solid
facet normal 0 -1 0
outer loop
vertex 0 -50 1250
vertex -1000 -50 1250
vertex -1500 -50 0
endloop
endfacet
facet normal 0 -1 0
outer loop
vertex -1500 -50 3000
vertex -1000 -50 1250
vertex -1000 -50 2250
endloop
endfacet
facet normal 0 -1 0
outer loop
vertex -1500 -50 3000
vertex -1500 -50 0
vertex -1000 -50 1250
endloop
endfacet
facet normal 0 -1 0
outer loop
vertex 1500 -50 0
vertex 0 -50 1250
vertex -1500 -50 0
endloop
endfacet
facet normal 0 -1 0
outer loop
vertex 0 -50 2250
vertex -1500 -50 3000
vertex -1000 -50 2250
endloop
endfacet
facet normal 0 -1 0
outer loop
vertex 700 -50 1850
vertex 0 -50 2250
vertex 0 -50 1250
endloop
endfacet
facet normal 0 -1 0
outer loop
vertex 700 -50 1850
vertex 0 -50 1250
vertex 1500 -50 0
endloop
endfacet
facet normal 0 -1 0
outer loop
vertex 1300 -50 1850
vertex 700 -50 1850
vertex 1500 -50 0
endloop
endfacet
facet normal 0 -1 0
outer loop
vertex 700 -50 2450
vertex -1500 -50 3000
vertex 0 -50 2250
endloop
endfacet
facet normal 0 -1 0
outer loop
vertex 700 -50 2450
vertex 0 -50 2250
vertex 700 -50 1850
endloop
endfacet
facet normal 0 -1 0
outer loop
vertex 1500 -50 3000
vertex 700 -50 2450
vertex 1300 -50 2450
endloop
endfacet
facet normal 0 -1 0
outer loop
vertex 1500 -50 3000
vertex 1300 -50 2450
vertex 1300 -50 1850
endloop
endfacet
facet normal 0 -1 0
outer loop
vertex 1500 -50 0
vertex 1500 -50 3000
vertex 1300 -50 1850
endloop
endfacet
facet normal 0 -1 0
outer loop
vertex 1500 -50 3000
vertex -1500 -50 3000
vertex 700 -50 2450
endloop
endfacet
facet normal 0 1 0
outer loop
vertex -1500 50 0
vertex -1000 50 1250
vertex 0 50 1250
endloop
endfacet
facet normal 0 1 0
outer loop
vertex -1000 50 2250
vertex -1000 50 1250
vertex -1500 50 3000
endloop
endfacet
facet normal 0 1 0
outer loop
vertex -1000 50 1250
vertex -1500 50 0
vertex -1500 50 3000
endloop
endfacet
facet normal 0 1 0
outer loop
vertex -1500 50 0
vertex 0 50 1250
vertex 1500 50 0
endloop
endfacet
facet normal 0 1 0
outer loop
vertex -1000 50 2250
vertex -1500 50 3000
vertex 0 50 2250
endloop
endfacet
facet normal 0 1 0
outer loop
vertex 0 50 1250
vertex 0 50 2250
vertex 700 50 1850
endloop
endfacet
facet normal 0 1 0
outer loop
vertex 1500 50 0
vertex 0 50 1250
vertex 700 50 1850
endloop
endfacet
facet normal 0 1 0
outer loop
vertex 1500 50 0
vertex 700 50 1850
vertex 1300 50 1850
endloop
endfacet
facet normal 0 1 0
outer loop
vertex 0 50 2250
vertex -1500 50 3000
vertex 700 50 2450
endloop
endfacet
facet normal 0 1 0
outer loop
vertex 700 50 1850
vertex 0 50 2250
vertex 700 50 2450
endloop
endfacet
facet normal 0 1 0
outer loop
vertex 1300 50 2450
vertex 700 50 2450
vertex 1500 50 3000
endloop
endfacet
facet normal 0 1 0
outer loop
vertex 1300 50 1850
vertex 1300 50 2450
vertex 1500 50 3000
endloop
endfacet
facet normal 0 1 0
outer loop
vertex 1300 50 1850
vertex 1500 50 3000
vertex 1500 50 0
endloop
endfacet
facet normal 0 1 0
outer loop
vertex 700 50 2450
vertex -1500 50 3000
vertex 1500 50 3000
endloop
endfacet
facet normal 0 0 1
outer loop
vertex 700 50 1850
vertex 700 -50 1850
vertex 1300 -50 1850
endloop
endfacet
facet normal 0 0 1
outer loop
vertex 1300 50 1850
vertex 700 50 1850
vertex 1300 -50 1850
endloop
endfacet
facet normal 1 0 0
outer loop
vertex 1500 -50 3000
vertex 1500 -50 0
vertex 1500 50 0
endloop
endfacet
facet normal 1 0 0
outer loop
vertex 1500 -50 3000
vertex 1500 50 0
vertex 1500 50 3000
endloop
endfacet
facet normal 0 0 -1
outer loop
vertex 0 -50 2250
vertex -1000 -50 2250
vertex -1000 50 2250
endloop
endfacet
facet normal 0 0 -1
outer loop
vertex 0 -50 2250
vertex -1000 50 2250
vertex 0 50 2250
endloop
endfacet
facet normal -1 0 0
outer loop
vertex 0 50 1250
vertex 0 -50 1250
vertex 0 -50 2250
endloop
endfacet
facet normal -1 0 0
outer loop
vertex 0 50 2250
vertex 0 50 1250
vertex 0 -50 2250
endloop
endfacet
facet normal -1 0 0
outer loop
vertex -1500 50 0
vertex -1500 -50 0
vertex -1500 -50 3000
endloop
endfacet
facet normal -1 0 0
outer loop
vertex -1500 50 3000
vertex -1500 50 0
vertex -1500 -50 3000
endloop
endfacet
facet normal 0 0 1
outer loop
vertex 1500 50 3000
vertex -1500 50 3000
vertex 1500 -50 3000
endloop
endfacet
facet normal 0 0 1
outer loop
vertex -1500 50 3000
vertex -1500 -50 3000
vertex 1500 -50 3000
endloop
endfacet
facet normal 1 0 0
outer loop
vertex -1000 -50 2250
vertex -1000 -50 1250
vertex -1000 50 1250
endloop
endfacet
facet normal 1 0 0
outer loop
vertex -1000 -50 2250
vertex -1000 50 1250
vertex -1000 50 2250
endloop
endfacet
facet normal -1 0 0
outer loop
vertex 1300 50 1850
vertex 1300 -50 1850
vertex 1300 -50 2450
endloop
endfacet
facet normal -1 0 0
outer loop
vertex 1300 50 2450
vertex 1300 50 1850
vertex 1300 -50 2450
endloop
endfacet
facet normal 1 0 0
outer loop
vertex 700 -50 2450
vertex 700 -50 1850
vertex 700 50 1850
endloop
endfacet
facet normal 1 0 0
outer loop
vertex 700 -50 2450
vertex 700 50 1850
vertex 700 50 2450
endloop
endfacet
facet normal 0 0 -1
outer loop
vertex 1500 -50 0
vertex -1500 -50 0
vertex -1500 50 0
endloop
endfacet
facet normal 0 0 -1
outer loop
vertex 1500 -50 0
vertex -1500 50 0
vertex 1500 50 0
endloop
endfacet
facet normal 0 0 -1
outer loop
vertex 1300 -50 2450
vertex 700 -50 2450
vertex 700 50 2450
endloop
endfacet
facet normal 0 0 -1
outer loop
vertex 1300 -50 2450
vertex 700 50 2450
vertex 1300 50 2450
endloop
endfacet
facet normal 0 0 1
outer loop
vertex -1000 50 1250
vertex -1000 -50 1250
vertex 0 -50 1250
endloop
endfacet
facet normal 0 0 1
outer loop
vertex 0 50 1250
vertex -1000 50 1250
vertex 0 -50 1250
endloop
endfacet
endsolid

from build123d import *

# Parameters (mm, degrees)
F0_W     = 3000
F0_H     = 3000
F1_DEPTH = 50
F2_W     = 1000
F2_H     = 1000
F2_W_2   = 600
F2_H_2   = 600
F3_DEPTH = 100.001


with BuildPart() as f1:
    # F0 (on Front) → F1 (new body, symmetric)
    with BuildSketch(Plane.XZ):
        with Locations((0, 1500)):
            Rectangle(F0_W, F0_H)
    extrude(amount=F1_DEPTH, both=True)

    # F2 (on face) → F3 (cut, through all)
    with BuildSketch(Plane.XZ.offset(50)):
        with Locations((-500, 1750)):
            Rectangle(F2_W, F2_H)
        with Locations((1000, 2150)):
            Rectangle(F2_W_2, F2_H_2)
    extrude(amount=-F3_DEPTH, mode=Mode.SUBTRACT)


solid = f1.part
